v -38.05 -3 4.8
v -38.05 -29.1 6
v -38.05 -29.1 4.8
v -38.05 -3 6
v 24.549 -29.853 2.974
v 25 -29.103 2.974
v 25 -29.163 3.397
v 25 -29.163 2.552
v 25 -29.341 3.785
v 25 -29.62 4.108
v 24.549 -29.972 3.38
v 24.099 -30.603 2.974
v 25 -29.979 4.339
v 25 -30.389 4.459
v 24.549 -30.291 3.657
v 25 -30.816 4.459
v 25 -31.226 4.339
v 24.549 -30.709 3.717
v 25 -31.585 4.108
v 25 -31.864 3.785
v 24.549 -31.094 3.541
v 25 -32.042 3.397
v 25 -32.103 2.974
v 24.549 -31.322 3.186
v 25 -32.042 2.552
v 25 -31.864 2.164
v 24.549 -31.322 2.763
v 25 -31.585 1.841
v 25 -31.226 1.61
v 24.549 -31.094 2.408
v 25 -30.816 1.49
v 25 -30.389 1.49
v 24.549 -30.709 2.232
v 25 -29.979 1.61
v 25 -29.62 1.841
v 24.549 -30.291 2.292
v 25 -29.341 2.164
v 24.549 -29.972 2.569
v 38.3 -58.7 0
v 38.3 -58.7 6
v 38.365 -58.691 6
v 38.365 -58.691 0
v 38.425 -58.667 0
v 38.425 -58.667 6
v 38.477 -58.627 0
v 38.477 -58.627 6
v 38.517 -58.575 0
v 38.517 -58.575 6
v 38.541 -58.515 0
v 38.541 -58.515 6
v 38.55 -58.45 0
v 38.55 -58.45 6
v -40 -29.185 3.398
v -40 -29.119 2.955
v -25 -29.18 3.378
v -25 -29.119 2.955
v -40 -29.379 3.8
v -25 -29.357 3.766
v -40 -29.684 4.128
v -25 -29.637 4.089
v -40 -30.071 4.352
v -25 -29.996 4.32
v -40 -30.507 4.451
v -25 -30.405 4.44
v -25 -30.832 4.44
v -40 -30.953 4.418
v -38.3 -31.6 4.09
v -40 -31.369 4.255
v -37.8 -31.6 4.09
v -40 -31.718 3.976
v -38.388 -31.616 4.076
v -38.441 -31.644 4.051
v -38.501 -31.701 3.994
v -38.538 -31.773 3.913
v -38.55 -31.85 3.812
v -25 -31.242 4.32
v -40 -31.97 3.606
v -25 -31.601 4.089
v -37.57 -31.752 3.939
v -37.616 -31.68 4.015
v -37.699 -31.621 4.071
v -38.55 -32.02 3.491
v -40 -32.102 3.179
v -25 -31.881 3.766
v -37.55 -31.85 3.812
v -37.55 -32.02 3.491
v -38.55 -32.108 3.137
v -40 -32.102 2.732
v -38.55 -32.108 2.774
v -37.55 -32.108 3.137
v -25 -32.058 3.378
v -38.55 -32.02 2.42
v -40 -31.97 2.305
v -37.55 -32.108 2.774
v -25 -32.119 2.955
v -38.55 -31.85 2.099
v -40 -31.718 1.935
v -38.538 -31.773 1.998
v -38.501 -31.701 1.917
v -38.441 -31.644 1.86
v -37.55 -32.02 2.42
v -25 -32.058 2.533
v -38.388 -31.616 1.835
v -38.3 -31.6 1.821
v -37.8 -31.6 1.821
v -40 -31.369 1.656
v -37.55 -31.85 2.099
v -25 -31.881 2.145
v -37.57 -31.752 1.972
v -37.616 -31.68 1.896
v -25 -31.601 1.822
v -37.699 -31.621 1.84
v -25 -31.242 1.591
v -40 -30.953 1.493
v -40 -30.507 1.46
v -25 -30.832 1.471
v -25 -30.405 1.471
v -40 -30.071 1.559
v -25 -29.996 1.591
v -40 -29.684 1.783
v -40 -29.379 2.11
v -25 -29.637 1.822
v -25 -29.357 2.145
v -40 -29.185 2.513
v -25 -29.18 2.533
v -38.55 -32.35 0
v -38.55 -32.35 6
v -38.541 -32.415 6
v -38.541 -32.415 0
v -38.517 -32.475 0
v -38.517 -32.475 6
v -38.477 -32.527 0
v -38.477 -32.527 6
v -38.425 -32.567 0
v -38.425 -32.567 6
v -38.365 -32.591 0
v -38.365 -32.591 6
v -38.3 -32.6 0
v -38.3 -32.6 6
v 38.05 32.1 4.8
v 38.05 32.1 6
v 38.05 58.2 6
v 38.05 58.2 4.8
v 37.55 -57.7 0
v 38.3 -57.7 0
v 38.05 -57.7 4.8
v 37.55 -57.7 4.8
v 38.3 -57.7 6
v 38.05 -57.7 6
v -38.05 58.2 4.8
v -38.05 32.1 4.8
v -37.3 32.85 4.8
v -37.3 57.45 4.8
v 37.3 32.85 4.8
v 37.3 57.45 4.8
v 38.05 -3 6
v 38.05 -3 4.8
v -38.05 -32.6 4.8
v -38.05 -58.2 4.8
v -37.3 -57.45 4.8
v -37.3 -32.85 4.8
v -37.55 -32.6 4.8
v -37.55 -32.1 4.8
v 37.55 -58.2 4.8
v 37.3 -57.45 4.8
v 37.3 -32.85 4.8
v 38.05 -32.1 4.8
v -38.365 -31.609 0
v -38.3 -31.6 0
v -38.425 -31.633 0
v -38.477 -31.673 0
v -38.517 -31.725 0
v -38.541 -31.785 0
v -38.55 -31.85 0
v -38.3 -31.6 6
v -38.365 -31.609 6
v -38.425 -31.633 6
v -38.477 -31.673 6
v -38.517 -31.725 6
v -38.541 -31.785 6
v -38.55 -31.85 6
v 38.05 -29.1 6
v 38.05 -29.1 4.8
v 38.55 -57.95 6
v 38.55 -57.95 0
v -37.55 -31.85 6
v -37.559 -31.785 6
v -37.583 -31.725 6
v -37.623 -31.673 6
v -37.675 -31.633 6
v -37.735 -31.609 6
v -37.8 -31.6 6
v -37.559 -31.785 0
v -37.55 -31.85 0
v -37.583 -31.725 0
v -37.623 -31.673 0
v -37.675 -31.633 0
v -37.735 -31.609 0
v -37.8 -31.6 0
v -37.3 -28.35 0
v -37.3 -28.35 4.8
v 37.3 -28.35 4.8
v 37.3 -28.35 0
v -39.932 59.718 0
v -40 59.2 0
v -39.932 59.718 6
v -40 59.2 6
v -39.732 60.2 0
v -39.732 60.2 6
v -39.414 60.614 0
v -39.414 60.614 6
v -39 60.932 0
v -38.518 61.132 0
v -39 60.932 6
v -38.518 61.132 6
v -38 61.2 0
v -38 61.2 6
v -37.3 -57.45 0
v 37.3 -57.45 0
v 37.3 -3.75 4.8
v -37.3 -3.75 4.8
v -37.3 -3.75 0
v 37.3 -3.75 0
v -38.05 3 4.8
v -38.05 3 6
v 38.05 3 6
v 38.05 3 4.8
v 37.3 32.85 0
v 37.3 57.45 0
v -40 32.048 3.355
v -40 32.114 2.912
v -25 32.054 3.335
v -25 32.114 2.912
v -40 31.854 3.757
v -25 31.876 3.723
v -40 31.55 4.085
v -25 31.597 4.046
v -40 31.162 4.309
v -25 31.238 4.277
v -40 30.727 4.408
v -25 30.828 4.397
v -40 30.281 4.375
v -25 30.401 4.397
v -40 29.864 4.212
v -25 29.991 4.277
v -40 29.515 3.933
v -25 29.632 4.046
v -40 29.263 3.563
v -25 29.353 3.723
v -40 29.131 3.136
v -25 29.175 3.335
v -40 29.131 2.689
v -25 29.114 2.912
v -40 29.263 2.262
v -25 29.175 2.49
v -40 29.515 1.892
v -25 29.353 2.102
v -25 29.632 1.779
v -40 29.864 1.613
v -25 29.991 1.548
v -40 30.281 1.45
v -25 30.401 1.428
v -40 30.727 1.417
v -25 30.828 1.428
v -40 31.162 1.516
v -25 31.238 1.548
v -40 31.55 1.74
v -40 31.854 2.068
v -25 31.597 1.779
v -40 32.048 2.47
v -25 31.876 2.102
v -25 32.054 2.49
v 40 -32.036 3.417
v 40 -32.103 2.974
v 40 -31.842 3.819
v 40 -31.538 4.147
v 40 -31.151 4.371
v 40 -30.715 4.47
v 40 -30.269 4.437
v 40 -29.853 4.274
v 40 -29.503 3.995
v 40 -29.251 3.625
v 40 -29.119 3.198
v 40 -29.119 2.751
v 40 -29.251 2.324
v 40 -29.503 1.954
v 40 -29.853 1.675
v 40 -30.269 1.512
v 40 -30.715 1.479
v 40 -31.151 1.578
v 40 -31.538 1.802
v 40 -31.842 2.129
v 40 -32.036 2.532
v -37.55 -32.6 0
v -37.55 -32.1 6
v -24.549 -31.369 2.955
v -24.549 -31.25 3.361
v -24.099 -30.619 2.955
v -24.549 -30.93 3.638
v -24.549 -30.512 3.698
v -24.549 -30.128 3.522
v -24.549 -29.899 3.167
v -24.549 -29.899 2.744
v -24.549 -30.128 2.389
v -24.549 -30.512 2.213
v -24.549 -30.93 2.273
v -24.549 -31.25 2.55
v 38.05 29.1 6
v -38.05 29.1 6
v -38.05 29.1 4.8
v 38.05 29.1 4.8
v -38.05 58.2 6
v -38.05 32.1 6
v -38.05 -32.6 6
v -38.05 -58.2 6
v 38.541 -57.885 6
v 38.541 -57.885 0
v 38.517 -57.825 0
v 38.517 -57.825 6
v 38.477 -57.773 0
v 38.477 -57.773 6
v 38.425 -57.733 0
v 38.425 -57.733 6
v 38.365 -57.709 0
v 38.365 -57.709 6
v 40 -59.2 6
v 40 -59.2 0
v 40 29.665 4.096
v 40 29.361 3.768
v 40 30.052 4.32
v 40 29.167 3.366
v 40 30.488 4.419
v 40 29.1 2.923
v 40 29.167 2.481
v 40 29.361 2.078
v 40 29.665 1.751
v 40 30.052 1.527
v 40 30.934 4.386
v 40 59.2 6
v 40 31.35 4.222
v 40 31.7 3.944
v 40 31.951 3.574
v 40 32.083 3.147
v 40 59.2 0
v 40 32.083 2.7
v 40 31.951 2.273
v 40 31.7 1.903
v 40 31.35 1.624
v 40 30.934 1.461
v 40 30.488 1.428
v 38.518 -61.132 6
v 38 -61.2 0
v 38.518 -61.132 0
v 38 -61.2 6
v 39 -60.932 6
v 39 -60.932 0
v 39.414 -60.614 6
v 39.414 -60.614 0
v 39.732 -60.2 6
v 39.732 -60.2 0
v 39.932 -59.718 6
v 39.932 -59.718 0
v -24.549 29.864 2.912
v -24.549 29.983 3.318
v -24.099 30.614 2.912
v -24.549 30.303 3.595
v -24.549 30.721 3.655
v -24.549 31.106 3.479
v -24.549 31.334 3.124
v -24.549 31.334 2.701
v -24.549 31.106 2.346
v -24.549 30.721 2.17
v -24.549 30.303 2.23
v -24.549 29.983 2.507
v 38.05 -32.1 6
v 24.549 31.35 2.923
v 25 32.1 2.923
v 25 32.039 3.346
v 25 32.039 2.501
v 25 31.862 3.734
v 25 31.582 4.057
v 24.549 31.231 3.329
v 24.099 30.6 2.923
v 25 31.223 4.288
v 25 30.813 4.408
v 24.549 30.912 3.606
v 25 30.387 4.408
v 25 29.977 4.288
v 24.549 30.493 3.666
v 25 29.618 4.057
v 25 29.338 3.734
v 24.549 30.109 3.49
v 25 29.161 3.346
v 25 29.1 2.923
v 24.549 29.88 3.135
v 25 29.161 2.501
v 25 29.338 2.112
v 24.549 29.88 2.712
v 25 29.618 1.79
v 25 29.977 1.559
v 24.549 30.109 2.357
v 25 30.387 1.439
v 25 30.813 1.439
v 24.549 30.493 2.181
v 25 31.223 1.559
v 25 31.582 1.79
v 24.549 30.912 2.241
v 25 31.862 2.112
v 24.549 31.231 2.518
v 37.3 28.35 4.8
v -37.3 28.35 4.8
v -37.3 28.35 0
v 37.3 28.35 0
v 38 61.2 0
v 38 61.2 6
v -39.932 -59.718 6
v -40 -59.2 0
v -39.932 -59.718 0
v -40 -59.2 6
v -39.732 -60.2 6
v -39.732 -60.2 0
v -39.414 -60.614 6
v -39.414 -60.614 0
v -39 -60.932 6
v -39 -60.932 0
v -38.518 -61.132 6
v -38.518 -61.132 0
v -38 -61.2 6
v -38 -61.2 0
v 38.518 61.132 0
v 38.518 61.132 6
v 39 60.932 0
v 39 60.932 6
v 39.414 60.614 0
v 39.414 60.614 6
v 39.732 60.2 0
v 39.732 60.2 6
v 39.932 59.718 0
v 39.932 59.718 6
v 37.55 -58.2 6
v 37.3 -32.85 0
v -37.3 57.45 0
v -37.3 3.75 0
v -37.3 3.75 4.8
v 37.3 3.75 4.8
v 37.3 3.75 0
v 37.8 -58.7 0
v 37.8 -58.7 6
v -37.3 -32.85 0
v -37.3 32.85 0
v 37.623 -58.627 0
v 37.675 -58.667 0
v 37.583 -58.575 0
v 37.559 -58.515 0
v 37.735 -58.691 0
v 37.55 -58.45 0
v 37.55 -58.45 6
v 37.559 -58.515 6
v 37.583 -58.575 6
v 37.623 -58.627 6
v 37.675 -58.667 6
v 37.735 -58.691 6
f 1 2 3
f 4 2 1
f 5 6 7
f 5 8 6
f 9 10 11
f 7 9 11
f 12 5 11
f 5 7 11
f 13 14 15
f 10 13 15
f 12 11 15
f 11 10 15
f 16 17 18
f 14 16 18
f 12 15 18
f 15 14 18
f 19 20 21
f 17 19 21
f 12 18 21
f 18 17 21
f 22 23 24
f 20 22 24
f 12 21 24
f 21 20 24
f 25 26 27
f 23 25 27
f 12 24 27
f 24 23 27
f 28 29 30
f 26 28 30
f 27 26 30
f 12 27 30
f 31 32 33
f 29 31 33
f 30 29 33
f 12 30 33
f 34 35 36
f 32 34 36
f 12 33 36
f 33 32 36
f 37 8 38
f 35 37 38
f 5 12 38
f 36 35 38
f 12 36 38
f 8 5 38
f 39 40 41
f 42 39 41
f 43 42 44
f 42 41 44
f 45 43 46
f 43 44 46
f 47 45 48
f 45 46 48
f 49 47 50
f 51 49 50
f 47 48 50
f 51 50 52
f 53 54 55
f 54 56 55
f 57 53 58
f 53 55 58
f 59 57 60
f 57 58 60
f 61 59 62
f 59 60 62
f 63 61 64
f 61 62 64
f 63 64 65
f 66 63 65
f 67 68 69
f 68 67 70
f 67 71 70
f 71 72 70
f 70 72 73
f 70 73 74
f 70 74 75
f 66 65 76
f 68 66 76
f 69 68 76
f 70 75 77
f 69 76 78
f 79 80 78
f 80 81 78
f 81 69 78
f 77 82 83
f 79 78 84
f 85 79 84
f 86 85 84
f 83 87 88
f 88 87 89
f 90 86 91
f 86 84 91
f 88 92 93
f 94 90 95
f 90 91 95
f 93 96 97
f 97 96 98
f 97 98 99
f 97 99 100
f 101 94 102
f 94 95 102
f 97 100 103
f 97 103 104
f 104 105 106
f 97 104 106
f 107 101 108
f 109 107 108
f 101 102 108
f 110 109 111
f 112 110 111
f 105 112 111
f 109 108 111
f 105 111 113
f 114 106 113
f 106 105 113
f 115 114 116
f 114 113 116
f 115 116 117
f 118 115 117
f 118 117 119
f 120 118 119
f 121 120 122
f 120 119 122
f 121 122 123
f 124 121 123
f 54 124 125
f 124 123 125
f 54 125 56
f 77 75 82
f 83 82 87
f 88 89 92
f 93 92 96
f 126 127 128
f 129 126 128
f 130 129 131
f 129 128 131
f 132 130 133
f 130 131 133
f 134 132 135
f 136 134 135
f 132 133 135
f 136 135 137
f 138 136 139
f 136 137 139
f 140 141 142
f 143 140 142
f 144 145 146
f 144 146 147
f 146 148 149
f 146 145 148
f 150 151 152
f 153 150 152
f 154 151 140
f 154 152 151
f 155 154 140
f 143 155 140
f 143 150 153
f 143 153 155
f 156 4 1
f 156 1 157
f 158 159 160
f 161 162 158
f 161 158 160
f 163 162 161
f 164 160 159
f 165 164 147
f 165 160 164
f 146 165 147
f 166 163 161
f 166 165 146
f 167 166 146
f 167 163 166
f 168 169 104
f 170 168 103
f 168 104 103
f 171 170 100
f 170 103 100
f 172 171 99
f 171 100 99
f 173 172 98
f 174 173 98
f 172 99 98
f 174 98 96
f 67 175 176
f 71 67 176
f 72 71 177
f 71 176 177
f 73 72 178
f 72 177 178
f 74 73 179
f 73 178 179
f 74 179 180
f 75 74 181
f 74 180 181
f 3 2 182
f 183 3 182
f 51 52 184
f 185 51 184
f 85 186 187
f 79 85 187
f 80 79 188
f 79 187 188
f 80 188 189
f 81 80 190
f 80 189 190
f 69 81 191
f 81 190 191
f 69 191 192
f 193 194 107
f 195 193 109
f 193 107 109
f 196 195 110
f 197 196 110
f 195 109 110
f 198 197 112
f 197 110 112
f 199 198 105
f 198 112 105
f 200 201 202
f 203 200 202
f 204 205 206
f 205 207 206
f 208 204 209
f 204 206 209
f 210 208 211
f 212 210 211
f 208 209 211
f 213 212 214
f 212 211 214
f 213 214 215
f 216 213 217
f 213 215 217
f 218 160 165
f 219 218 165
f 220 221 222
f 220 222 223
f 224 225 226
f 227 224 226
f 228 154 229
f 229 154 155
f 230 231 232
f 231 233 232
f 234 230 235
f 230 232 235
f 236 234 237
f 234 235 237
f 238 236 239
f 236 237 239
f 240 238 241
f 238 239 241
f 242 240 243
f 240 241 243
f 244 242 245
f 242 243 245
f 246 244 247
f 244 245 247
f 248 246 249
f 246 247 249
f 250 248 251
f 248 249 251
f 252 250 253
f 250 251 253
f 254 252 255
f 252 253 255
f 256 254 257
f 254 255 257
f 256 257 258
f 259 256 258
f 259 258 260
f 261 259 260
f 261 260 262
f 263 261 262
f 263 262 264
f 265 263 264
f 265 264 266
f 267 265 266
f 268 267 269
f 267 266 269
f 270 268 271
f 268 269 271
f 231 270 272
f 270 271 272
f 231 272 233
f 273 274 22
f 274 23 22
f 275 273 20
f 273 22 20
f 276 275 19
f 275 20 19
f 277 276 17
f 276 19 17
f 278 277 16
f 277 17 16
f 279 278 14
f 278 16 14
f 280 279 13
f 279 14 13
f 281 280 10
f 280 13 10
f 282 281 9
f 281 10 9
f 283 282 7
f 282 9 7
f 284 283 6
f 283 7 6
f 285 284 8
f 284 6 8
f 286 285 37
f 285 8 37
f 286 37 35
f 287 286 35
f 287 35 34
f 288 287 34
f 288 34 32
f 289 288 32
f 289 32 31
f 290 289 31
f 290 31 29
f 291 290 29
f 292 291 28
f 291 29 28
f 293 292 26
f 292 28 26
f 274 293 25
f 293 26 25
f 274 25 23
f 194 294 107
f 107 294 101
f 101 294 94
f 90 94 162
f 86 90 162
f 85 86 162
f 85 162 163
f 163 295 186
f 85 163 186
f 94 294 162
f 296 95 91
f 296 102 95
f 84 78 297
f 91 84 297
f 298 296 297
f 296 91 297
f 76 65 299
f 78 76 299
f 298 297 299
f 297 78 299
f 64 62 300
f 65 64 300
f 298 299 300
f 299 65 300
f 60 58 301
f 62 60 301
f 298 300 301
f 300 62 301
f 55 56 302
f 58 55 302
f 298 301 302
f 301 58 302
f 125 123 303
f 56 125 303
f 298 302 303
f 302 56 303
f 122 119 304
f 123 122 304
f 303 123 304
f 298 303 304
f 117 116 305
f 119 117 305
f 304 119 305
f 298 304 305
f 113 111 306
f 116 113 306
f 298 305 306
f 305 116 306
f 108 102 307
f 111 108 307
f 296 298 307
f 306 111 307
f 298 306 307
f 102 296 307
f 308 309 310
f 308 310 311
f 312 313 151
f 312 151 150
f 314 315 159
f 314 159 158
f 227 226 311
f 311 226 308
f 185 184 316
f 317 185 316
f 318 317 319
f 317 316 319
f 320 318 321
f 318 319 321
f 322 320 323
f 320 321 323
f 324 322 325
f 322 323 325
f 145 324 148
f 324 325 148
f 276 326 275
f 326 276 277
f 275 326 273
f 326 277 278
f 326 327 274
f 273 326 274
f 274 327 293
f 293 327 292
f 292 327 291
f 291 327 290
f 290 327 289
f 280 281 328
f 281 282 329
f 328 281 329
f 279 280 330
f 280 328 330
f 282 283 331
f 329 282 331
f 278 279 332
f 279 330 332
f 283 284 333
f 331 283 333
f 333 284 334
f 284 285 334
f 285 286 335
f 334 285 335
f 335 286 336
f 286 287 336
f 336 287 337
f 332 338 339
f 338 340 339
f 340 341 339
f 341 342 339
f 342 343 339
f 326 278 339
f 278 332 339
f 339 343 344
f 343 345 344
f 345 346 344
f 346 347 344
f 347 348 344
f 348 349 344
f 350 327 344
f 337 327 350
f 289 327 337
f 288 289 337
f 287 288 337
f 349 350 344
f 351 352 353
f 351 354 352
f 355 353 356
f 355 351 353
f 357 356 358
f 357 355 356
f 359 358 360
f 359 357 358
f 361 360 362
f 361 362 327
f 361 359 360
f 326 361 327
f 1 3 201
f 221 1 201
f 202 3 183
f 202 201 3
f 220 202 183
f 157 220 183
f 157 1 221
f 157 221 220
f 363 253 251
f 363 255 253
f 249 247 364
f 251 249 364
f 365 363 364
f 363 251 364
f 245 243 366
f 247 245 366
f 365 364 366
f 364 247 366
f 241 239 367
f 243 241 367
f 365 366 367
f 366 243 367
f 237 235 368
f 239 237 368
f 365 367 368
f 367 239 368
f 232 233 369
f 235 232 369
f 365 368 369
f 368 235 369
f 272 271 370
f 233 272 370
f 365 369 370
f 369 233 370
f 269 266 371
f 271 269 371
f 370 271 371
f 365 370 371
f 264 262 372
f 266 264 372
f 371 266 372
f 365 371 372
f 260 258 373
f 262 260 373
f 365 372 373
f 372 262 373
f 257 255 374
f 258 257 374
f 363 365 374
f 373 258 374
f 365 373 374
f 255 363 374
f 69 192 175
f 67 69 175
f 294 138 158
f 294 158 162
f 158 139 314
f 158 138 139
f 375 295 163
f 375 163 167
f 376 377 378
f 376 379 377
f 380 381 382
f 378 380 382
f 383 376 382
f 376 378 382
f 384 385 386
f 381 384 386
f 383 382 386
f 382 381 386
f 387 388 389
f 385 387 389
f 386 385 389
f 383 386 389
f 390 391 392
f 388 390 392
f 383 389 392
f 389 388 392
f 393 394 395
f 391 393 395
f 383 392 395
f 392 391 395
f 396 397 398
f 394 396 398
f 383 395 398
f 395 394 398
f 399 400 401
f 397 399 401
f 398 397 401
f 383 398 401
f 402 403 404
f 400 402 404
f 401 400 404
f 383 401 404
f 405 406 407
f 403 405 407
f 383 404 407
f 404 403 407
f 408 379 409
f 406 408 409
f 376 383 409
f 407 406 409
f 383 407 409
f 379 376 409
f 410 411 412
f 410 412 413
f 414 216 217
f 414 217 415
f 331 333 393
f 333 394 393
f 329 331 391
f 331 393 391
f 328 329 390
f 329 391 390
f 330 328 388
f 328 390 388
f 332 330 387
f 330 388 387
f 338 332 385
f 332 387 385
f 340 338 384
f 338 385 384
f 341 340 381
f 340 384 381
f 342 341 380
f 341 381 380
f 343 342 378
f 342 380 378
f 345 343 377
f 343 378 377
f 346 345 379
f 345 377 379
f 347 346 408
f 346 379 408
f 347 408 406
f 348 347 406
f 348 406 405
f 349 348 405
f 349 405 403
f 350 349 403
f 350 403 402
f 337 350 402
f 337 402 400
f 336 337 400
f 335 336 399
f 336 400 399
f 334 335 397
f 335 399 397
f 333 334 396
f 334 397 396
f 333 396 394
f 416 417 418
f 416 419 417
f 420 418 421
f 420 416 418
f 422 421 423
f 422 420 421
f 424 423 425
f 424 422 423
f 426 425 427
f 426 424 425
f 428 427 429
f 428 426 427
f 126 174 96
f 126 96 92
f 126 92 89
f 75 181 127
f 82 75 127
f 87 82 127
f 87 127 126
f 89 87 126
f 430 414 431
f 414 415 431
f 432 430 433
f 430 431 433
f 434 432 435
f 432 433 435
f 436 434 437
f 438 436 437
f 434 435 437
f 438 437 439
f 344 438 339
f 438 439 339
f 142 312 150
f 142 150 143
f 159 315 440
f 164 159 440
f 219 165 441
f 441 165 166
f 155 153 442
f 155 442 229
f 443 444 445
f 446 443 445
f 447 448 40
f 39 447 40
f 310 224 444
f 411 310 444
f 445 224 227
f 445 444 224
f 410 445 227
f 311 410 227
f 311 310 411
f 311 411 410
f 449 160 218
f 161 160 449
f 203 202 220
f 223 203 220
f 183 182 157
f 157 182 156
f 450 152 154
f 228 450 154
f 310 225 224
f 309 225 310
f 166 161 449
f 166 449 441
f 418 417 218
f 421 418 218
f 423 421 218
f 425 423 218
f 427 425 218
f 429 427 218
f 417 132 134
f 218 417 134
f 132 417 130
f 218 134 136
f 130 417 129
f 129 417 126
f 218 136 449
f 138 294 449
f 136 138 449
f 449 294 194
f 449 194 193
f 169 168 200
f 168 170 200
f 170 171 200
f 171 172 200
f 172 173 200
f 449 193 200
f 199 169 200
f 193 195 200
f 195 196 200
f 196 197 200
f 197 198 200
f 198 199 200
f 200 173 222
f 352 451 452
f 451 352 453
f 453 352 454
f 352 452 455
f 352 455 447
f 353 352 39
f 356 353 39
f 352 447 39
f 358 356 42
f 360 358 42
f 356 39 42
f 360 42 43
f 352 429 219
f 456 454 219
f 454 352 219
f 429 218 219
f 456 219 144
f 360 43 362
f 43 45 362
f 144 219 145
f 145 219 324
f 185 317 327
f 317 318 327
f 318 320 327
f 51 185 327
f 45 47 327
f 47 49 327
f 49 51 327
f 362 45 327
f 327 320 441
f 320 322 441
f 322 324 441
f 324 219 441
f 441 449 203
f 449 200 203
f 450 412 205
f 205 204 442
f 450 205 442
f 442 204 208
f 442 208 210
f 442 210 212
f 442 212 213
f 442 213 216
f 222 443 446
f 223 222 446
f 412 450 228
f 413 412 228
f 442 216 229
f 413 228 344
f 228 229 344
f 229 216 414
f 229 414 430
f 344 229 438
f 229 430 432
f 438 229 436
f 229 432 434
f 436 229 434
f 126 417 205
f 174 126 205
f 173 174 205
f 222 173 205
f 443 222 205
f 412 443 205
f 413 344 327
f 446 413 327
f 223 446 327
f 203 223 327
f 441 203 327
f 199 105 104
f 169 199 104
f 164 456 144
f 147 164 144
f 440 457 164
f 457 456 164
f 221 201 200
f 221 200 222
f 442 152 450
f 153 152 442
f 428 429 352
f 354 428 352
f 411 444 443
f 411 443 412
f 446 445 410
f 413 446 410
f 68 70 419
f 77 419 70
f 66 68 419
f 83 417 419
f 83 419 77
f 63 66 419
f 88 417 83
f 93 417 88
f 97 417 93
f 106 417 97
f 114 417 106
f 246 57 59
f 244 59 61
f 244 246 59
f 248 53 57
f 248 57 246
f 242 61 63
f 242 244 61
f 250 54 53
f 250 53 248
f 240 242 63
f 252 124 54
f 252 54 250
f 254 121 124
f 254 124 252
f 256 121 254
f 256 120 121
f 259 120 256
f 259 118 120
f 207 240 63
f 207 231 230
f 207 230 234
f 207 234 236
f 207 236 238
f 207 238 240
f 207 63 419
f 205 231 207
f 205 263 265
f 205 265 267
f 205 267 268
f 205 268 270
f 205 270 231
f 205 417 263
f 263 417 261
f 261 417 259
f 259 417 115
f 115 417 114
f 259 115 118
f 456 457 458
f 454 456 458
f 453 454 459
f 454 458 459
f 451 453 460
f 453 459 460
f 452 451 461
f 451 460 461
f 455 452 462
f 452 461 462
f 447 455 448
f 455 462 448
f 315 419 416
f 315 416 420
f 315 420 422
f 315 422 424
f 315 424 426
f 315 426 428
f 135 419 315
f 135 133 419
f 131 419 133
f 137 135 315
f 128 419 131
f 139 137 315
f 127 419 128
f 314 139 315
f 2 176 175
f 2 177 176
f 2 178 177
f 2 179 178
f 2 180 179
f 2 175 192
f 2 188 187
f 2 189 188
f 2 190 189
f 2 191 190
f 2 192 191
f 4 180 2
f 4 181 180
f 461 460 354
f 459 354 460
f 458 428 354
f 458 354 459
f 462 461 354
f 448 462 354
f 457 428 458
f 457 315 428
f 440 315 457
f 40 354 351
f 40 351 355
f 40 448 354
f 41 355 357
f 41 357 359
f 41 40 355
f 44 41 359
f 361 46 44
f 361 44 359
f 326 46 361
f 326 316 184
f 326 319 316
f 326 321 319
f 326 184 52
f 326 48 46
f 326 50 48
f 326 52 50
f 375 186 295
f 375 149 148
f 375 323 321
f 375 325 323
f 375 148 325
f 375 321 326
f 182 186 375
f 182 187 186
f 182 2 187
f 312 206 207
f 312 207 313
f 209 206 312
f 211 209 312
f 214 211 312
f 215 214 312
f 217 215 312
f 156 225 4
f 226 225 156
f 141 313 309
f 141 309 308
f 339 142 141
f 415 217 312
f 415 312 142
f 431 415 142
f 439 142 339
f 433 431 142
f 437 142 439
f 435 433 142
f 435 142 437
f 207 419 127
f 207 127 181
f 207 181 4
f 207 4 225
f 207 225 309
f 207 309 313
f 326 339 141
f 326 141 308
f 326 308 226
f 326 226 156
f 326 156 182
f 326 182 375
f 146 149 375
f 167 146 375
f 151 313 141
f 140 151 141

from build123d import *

# Parameters (mm, degrees)
F0_W      = 80
F0_H      = 122.4
F1_DEPTH  = 6
F2_W      = 76.1
F2_H      = 26.1
F2_W_2    = 74.6
F2_H_2    = 24.6
F3_DEPTH  = 1.2
F4_DEPTH  = 6.001
F6_D      = 3
F6_DEPTH  = 15
F6_TIP    = 0.9012909285
F8_D      = 3
F8_DEPTH  = 15
F8_TIP    = 0.9012909285
F9_R      = 2
F11_DEPTH = 6.001
F12_W     = 0.5
F12_H     = 0.5
F13_DEPTH = 4.8010001
F15_DEPTH = 6.0010001
F16_W     = 0.5
F16_H     = 0.5
F17_DEPTH = 4.8010001


# Not quite as in the source:
# - the program builds the solid bodies; features that only make, move or delete a surface that nothing else refers to are left out


with BuildPart() as f1:
    # F0 (on Top) → F1 (new body)
    with BuildSketch(Plane.XY):
        Rectangle(F0_W, F0_H)
    extrude(amount=F1_DEPTH)

    # F2 (on face) → F3 (cut)
    with BuildSketch(Plane.XY.offset(6)):
        with Locations((0, -45.15)):
            Rectangle(F2_W, F2_H)
        with Locations((0, -45.15)):
            Rectangle(F2_W_2, F2_H_2, mode=Mode.SUBTRACT)
        with Locations((0, -16.05)):
            Rectangle(F2_W, F2_H)
        with Locations((0, -16.05)):
            Rectangle(F2_W_2, F2_H_2, mode=Mode.SUBTRACT)
        with Locations((0, 16.05)):
            Rectangle(F2_W, F2_H)
        with Locations((0, 16.05)):
            Rectangle(F2_W_2, F2_H_2, mode=Mode.SUBTRACT)
        with Locations((0, 45.15)):
            Rectangle(F2_W, F2_H)
        with Locations((0, 45.15)):
            Rectangle(F2_W_2, F2_H_2, mode=Mode.SUBTRACT)
    extrude(amount=-F3_DEPTH, mode=Mode.SUBTRACT)

    # F4 (cut, through all): faces of the model
    f4_faces = [f1.faces().sort_by_distance(p)[0] for p in [
        (0, -45.15, 6),
        (0, -16.05, 6),
        (0, 16.05, 6),
        (0, 45.15, 6),
    ]]
    extrude(f4_faces, amount=-F4_DEPTH, mode=Mode.SUBTRACT)

    # F6
    with Locations(Plane.YZ.offset(40)):
        with Locations((-30.6025246664, 2.9744678242), (30.6, 2.9233971525)):
            Hole(F6_D / 2, depth=F6_DEPTH)
            with Locations((0, 0, -(F6_DEPTH + F6_TIP / 2))):  # 118° drill point
                Cone(0, F6_D / 2, F6_TIP, mode=Mode.SUBTRACT)

    # F8
    with Locations(Plane(origin=(-40, 0, 0), x_dir=(0, -1, 0), z_dir=(-1, 0, 0))):
        with Locations((30.6188296527, 2.9554700013), (-30.6144393981, 2.9124866705)):
            Hole(F8_D / 2, depth=F8_DEPTH)
            with Locations((0, 0, -(F8_DEPTH + F8_TIP / 2))):  # 118° drill point
                Cone(0, F8_D / 2, F8_TIP, mode=Mode.SUBTRACT)

    # F9
    f9_edges = [f1.edges().sort_by_distance(p)[0] for p in [
        (-40, -61.2, 3),
        (40, -61.2, 3),
        (40, 61.2, 3),
        (-40, 61.2, 3),
    ]]
    fillet(f9_edges, radius=F9_R)

    # F10 (on face) → F11 (cut, through all)
    with BuildSketch(Plane.XY.offset(6)):
        with BuildLine():
            Line((-38.3, -32.6), (-38.05, -32.6))
            Line((-38.05, -32.6), (-38.05, -32.1))
            Line((-38.05, -32.1), (-37.55, -32.1))
            Line((-37.55, -32.1), (-37.55, -31.85))
            ThreePointArc((-37.55, -31.85), (-37.6232233047, -31.6732233047), (-37.8, -31.6))
            Line((-37.8, -31.6), (-38.3, -31.6))
            ThreePointArc((-38.3, -31.6), (-38.4767766953, -31.6732233047), (-38.55, -31.85))
            Line((-38.55, -31.85), (-38.55, -32.35))
            ThreePointArc((-38.55, -32.35), (-38.4767766953, -32.5267766953), (-38.3, -32.6))
        make_face()
    extrude(amount=-F11_DEPTH, mode=Mode.SUBTRACT)

    # F12 (on face) → F13 (cut, through all)
    with BuildSketch(Plane.XY.offset(4.8)):
        with Locations((-37.8, -32.35)):
            Rectangle(F12_W, F12_H)
    extrude(amount=-F13_DEPTH, mode=Mode.SUBTRACT)

    # F14 (on face) → F15 (cut, through all)
    with BuildSketch(Plane.XY.offset(6)):
        with BuildLine():
            Line((37.8, -58.7), (38.3, -58.7))
            ThreePointArc((38.3, -58.7), (38.4767766953, -58.6267766953), (38.55, -58.45))
            Line((38.55, -58.45), (38.55, -57.95))
            ThreePointArc((38.55, -57.95), (38.4767766953, -57.7732233047), (38.3, -57.7))
            Line((38.3, -57.7), (38.05, -57.7))
            Line((38.05, -57.7), (38.05, -58.2))
            Line((38.05, -58.2), (37.55, -58.2))
            Line((37.55, -58.2), (37.55, -58.45))
            ThreePointArc((37.55, -58.45), (37.6232233047, -58.6267766953), (37.8, -58.7))
        make_face()
    extrude(amount=-F15_DEPTH, mode=Mode.SUBTRACT)

    # F16 (on face) → F17 (cut, through all)
    with BuildSketch(Plane.XY.offset(4.8)):
        with Locations((37.8, -57.95)):
            Rectangle(F16_W, F16_H)
    extrude(amount=-F17_DEPTH, mode=Mode.SUBTRACT)


solid = f1.part
